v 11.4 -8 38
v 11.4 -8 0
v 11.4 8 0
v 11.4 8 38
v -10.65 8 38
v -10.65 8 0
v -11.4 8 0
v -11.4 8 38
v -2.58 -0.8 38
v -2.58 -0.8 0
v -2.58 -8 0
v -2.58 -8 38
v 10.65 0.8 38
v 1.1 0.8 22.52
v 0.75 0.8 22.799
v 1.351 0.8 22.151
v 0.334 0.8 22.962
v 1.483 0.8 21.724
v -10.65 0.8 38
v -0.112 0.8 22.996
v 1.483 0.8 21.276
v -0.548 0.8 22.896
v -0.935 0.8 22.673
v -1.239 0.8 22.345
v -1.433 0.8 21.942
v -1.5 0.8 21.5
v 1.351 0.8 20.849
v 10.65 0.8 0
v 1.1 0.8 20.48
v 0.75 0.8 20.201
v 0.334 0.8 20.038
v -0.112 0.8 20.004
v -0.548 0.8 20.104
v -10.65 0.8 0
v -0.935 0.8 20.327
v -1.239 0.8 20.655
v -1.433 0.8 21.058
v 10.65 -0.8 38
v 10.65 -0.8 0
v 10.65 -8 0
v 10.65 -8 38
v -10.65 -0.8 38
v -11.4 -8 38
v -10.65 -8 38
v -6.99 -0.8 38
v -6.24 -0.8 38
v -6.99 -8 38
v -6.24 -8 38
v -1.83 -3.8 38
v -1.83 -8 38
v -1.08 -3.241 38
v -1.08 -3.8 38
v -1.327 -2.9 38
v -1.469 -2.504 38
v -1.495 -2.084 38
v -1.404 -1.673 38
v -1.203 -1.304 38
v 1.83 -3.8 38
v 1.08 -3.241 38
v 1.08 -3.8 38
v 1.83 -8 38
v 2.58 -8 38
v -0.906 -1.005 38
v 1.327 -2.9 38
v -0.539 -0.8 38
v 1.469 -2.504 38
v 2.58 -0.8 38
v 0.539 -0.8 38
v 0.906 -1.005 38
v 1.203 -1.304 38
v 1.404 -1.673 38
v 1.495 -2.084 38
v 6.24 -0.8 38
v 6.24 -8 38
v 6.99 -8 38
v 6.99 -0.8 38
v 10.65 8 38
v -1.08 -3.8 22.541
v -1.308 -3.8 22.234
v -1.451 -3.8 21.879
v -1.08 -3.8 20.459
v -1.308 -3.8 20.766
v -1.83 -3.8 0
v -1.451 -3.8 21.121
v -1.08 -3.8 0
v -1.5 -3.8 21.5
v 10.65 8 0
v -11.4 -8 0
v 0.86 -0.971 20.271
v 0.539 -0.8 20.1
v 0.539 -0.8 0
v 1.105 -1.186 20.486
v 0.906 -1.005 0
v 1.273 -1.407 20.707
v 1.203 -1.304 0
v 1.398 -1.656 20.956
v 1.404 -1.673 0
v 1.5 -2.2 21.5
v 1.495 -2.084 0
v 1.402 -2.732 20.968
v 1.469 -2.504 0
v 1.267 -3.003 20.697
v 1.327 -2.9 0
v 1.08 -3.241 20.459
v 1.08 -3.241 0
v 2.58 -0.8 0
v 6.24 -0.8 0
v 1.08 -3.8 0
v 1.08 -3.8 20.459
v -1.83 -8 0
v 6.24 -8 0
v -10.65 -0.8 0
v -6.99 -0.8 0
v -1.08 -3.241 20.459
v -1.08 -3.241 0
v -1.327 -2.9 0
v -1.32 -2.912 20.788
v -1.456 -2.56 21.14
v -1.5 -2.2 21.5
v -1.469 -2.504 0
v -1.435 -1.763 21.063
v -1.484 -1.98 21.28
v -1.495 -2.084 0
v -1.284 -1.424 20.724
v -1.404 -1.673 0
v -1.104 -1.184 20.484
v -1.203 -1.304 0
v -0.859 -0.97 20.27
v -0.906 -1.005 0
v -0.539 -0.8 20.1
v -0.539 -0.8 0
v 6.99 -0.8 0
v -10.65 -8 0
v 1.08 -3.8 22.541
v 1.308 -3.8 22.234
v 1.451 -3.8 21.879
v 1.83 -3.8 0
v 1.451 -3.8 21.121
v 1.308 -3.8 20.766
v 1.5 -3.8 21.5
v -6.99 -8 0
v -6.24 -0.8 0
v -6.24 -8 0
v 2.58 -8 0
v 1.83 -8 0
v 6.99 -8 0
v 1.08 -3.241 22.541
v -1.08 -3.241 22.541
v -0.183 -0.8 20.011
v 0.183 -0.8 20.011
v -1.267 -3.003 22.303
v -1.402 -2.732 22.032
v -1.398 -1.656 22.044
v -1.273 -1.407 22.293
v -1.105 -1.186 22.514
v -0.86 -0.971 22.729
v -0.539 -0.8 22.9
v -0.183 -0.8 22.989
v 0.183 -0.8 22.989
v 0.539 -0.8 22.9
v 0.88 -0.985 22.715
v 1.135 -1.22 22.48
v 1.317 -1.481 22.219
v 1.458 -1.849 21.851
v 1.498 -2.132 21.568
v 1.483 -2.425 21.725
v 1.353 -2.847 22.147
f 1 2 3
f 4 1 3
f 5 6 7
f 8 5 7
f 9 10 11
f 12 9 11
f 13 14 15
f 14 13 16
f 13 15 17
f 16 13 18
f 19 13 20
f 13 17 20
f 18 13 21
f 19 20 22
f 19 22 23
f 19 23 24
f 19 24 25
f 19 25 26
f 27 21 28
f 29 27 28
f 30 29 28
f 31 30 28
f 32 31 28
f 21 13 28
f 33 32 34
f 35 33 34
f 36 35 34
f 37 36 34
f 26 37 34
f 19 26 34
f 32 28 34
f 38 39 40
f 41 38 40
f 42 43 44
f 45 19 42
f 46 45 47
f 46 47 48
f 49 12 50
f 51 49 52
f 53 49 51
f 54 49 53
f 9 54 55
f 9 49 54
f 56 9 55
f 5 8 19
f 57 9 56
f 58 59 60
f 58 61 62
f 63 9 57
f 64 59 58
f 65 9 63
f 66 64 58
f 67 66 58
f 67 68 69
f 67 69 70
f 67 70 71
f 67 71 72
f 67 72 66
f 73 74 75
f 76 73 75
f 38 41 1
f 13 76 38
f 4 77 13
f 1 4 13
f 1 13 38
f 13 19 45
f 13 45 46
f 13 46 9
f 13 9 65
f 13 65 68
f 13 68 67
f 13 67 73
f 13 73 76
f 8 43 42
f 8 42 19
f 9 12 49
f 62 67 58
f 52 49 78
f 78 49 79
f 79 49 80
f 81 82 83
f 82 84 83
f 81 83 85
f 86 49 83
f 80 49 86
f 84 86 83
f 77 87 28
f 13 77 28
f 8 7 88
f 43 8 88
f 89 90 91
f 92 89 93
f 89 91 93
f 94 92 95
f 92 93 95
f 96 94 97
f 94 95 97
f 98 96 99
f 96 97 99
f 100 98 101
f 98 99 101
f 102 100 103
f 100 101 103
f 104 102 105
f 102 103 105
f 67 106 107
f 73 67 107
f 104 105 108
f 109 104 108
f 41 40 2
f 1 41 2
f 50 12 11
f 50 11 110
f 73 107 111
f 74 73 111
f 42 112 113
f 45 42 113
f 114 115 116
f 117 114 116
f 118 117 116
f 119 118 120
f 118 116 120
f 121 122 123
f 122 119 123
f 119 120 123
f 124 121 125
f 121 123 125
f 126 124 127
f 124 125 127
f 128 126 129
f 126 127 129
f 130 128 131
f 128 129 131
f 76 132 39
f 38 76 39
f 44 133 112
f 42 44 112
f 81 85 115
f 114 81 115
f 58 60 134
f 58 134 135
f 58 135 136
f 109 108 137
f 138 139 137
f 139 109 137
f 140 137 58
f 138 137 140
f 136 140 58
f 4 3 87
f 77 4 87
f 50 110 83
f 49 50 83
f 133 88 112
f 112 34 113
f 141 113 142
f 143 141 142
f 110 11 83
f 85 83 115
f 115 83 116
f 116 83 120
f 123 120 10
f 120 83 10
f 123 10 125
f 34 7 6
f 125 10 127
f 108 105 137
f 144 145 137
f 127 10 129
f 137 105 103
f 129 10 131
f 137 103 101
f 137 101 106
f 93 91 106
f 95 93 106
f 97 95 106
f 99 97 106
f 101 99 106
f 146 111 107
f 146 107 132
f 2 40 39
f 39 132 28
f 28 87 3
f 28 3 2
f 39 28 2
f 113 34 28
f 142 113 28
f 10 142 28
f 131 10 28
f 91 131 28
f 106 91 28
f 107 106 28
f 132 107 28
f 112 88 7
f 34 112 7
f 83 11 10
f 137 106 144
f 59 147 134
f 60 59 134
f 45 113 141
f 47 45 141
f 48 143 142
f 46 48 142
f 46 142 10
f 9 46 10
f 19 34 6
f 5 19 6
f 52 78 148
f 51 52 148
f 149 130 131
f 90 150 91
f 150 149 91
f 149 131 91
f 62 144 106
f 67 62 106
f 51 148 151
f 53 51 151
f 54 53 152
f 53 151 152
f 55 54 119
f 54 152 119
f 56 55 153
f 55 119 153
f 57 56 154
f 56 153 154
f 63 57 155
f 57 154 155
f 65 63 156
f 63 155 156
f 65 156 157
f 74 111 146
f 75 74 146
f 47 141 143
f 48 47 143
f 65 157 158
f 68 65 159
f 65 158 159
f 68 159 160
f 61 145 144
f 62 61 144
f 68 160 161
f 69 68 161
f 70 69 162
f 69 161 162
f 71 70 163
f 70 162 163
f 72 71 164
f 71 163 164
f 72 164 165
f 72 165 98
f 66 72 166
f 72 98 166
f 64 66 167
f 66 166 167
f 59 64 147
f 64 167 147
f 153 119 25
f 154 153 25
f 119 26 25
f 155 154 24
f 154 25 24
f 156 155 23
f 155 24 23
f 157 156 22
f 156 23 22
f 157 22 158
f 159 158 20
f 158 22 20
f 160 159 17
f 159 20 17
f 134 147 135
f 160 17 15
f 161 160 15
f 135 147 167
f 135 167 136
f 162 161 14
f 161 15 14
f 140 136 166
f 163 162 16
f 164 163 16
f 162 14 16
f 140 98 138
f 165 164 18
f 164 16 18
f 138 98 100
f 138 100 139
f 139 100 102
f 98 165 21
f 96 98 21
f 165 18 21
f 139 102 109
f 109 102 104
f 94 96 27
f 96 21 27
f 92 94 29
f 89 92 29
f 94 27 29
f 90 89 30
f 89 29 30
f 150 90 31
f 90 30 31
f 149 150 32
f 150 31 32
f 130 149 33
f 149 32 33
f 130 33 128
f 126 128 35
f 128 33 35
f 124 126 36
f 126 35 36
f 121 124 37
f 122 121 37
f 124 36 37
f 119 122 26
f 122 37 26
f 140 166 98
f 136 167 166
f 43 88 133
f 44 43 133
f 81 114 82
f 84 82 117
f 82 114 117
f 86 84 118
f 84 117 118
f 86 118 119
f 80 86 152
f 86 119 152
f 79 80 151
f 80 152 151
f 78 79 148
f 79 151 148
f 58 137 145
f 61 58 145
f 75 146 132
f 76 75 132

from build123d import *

# Parameters (mm, degrees)
BOSS_EXTRUDE1_DEPTH = 38
SKETCH2_R           = 1.5
CUT_EXTRUDE1_DEPTH  = 11


with BuildPart() as part:
    # Sketch1 → Boss-Extrude1 (new body)
    with BuildSketch(Plane.XY):
        with BuildLine():
            Line((10.65, -8), (11.4, -8))
            Line((11.4, -8), (11.4, 8))
            Line((11.4, 8), (10.65, 8))
            Line((10.65, 8), (10.65, 0.8))
            Line((10.65, 0.8), (-10.65, 0.8))
            Line((-10.65, 0.8), (-10.65, 8))
            Line((-10.65, 8), (-11.4, 8))
            Line((-11.4, 8), (-11.4, -8))
            Line((-11.4, -8), (-10.65, -8))
            Line((-10.65, -8), (-10.65, -0.8))
            Line((-10.65, -0.8), (-6.99, -0.8))
            Line((-6.99, -0.8), (-6.99, -8))
            Line((-6.99, -8), (-6.24, -8))
            Line((-6.24, -8), (-6.24, -0.8))
            Line((-6.24, -0.8), (-2.58, -0.8))
            Line((-2.58, -0.8), (-2.58, -8))
            Line((-2.58, -8), (-1.83, -8))
            Line((-1.83, -8), (-1.83, -3.8))
            Line((-1.83, -3.8), (-1.83, -0.8))
            Line((-1.83, -0.8), (-0.538516481, -0.8))
            ThreePointArc((-0.538516481, -0.8), (0, -0.7), (0.538516481, -0.8))
            Line((0.538516481, -0.8), (1.83, -0.8))
            Line((1.83, -0.8), (1.83, -3.8))
            Line((1.83, -3.8), (1.83, -8))
            Line((1.83, -8), (2.58, -8))
            Line((2.58, -8), (2.58, -0.8))
            Line((2.58, -0.8), (6.24, -0.8))
            Line((6.24, -0.8), (6.24, -8))
            Line((6.24, -8), (6.99, -8))
            Line((6.99, -8), (6.99, -0.8))
            Line((6.99, -0.8), (10.65, -0.8))
            Line((10.65, -0.8), (10.65, -8))
        make_face()
        with BuildLine():
            Line((-1.83, -0.8), (-1.83, -3.8))
            Line((-1.83, -3.8), (-1.08, -3.8))
            Line((-1.08, -3.8), (-1.08, -3.240961094))
            ThreePointArc((-1.08, -3.240961094), (-1.46440147, -1.87514875), (-0.538516481, -0.8))
            Line((-0.538516481, -0.8), (-1.83, -0.8))
        make_face()
        with BuildLine():
            Line((-0.538516481, -0.8), (0.538516481, -0.8))
            ThreePointArc((0.538516481, -0.8), (0, -0.7), (-0.538516481, -0.8))
        make_face()
        with BuildLine():
            Line((1.08, -3.8), (1.83, -3.8))
            Line((1.83, -3.8), (1.83, -0.8))
            Line((1.83, -0.8), (0.538516481, -0.8))
            ThreePointArc((0.538516481, -0.8), (1.46440147, -1.87514875), (1.08, -3.240961094))
            Line((1.08, -3.240961094), (1.08, -3.8))
        make_face()
    extrude(amount=BOSS_EXTRUDE1_DEPTH)

    # Sketch2 → Cut-Extrude1 (cut)
    with BuildSketch(Plane(origin=(0, 0.8, 0), x_dir=(1, 0, 0), z_dir=(0, 1, 0))):
        with Locations(Location((0, -21.5, 0), (0, 0, 180))):
            Circle(SKETCH2_R)
    extrude(amount=-CUT_EXTRUDE1_DEPTH, mode=Mode.SUBTRACT)


solid = part.part
